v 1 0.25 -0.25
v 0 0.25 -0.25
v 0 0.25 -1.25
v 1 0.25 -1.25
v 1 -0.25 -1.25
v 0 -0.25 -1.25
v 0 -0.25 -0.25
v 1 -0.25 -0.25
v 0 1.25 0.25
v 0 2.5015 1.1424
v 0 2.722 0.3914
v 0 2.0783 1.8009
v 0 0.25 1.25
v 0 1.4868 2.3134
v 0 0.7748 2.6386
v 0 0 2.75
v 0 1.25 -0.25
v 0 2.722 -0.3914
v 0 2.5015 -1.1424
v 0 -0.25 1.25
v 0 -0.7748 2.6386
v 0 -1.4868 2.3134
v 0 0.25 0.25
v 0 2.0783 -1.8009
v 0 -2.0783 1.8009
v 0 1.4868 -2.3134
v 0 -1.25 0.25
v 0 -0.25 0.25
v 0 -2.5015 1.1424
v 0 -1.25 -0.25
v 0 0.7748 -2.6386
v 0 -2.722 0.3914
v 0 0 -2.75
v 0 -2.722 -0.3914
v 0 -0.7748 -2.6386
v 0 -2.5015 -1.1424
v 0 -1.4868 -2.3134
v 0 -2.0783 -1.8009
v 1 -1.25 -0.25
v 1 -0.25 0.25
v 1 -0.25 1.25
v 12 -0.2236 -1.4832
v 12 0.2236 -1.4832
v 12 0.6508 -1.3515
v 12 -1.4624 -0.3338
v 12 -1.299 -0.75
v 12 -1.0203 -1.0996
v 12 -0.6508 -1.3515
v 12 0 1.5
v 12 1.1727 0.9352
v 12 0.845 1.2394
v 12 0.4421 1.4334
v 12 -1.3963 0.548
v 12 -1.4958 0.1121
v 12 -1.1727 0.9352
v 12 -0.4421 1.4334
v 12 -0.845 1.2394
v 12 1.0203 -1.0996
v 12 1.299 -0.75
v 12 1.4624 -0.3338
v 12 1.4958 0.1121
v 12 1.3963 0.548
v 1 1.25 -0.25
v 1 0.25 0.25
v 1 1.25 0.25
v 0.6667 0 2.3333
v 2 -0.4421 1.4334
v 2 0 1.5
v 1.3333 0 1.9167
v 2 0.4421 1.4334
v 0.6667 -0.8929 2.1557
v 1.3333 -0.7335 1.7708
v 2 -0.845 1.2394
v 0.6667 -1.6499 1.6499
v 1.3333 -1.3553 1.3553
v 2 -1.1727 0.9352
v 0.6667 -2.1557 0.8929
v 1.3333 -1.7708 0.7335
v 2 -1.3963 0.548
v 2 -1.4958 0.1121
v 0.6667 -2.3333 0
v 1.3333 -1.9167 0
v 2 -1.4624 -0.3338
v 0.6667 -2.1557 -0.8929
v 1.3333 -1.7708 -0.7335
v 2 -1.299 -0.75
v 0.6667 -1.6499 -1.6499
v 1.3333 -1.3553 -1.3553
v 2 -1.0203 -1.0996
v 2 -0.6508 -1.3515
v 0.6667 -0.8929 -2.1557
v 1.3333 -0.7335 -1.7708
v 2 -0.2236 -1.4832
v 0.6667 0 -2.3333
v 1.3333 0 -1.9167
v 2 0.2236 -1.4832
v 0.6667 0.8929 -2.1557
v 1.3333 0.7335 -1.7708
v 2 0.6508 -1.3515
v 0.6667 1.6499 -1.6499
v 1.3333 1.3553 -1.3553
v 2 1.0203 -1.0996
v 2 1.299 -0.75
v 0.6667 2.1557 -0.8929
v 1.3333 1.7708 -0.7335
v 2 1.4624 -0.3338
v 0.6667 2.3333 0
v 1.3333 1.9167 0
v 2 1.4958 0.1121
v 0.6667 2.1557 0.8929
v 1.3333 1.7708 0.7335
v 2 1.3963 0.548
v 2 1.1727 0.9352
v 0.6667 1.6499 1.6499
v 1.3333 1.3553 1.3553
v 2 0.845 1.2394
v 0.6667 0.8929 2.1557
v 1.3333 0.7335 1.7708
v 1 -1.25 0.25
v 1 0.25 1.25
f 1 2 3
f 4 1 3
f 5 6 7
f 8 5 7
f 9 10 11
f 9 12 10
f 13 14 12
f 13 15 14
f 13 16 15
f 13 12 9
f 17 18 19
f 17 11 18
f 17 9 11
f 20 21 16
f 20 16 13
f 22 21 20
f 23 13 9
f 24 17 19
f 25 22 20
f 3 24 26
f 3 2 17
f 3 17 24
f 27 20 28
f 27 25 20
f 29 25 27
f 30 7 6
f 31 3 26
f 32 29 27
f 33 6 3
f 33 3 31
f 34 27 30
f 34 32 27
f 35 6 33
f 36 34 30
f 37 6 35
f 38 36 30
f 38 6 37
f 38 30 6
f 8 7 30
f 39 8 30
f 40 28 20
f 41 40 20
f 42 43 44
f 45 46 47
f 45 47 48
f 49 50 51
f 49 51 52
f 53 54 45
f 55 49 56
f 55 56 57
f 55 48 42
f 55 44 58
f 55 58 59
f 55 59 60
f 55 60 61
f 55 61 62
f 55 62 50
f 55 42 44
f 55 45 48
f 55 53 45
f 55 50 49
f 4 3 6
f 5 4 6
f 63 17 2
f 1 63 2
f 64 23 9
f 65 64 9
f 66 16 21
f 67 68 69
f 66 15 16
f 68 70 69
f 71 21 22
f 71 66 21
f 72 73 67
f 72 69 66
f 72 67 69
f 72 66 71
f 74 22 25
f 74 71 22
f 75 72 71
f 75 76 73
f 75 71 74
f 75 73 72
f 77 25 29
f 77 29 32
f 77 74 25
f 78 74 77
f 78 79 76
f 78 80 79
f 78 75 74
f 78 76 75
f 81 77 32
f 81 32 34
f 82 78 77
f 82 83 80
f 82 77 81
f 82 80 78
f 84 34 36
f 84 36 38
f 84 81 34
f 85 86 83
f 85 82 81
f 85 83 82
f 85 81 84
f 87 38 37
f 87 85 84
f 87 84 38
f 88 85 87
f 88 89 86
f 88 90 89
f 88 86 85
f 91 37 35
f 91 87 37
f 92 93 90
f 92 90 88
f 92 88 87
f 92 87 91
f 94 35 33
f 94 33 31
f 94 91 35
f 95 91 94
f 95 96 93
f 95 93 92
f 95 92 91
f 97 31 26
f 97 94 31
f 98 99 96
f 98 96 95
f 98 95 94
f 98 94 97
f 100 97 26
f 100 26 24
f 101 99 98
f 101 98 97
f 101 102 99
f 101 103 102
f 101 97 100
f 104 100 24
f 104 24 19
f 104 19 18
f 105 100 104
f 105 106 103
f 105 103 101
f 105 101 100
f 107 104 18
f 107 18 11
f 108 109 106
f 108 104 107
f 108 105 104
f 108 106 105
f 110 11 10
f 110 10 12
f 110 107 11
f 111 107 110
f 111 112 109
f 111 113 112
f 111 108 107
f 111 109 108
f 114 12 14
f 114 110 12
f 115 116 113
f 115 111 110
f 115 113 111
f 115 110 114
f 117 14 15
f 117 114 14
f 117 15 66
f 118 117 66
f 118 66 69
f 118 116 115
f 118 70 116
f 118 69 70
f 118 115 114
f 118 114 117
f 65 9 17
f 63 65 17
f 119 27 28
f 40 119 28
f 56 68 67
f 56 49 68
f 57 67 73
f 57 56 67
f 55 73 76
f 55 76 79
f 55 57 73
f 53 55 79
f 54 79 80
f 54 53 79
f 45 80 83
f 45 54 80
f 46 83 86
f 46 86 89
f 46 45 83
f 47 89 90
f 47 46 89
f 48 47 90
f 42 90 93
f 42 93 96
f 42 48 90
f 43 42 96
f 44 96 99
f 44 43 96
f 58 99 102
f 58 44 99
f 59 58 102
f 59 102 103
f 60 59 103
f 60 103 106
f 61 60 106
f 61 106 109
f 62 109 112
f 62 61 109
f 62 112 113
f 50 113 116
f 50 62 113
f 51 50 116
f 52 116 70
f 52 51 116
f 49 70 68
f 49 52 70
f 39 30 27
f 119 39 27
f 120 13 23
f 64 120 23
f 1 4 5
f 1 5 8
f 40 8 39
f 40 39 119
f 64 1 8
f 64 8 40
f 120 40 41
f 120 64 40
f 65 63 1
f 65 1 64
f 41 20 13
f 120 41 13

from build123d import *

# Parameters (mm, degrees)
CUT_EXTRUDE_1_DEPTH = 1


with BuildPart() as part:
    # 草图4 → 旋转1 (revolve)
    with BuildSketch(Plane(origin=(0, 0, 0), x_dir=(1, 0, 0), z_dir=(0, 1, 0)), mode=Mode.PRIVATE) as revolve_1_sk:
        Polygon((0, 0), (0, 2.75), (2, 1.5), (12, 1.5), (12, 0), align=None)
    revolve(revolve_1_sk.sketch.rotate(Axis((-2.103529412, 0, 0), (1, 0, 0)), 180), axis=Axis((-2.103529412, 0, 0), (1, 0, 0)))

    # 草图5 → 切除-拉伸1 (cut)
    with BuildSketch(Plane.ZY):
        Polygon((-0.25, 0.25), (-1.25, 0.25), (-1.25, -0.25), (-0.25, -0.25), (-0.25, -1.25), (0.25, -1.25), (0.25, -0.25), (1.25, -0.25), (1.25, 0.25), (0.25, 0.25), (0.25, 1.25), (-0.25, 1.25), align=None)
    extrude(amount=-CUT_EXTRUDE_1_DEPTH, mode=Mode.SUBTRACT)


solid = part.part
